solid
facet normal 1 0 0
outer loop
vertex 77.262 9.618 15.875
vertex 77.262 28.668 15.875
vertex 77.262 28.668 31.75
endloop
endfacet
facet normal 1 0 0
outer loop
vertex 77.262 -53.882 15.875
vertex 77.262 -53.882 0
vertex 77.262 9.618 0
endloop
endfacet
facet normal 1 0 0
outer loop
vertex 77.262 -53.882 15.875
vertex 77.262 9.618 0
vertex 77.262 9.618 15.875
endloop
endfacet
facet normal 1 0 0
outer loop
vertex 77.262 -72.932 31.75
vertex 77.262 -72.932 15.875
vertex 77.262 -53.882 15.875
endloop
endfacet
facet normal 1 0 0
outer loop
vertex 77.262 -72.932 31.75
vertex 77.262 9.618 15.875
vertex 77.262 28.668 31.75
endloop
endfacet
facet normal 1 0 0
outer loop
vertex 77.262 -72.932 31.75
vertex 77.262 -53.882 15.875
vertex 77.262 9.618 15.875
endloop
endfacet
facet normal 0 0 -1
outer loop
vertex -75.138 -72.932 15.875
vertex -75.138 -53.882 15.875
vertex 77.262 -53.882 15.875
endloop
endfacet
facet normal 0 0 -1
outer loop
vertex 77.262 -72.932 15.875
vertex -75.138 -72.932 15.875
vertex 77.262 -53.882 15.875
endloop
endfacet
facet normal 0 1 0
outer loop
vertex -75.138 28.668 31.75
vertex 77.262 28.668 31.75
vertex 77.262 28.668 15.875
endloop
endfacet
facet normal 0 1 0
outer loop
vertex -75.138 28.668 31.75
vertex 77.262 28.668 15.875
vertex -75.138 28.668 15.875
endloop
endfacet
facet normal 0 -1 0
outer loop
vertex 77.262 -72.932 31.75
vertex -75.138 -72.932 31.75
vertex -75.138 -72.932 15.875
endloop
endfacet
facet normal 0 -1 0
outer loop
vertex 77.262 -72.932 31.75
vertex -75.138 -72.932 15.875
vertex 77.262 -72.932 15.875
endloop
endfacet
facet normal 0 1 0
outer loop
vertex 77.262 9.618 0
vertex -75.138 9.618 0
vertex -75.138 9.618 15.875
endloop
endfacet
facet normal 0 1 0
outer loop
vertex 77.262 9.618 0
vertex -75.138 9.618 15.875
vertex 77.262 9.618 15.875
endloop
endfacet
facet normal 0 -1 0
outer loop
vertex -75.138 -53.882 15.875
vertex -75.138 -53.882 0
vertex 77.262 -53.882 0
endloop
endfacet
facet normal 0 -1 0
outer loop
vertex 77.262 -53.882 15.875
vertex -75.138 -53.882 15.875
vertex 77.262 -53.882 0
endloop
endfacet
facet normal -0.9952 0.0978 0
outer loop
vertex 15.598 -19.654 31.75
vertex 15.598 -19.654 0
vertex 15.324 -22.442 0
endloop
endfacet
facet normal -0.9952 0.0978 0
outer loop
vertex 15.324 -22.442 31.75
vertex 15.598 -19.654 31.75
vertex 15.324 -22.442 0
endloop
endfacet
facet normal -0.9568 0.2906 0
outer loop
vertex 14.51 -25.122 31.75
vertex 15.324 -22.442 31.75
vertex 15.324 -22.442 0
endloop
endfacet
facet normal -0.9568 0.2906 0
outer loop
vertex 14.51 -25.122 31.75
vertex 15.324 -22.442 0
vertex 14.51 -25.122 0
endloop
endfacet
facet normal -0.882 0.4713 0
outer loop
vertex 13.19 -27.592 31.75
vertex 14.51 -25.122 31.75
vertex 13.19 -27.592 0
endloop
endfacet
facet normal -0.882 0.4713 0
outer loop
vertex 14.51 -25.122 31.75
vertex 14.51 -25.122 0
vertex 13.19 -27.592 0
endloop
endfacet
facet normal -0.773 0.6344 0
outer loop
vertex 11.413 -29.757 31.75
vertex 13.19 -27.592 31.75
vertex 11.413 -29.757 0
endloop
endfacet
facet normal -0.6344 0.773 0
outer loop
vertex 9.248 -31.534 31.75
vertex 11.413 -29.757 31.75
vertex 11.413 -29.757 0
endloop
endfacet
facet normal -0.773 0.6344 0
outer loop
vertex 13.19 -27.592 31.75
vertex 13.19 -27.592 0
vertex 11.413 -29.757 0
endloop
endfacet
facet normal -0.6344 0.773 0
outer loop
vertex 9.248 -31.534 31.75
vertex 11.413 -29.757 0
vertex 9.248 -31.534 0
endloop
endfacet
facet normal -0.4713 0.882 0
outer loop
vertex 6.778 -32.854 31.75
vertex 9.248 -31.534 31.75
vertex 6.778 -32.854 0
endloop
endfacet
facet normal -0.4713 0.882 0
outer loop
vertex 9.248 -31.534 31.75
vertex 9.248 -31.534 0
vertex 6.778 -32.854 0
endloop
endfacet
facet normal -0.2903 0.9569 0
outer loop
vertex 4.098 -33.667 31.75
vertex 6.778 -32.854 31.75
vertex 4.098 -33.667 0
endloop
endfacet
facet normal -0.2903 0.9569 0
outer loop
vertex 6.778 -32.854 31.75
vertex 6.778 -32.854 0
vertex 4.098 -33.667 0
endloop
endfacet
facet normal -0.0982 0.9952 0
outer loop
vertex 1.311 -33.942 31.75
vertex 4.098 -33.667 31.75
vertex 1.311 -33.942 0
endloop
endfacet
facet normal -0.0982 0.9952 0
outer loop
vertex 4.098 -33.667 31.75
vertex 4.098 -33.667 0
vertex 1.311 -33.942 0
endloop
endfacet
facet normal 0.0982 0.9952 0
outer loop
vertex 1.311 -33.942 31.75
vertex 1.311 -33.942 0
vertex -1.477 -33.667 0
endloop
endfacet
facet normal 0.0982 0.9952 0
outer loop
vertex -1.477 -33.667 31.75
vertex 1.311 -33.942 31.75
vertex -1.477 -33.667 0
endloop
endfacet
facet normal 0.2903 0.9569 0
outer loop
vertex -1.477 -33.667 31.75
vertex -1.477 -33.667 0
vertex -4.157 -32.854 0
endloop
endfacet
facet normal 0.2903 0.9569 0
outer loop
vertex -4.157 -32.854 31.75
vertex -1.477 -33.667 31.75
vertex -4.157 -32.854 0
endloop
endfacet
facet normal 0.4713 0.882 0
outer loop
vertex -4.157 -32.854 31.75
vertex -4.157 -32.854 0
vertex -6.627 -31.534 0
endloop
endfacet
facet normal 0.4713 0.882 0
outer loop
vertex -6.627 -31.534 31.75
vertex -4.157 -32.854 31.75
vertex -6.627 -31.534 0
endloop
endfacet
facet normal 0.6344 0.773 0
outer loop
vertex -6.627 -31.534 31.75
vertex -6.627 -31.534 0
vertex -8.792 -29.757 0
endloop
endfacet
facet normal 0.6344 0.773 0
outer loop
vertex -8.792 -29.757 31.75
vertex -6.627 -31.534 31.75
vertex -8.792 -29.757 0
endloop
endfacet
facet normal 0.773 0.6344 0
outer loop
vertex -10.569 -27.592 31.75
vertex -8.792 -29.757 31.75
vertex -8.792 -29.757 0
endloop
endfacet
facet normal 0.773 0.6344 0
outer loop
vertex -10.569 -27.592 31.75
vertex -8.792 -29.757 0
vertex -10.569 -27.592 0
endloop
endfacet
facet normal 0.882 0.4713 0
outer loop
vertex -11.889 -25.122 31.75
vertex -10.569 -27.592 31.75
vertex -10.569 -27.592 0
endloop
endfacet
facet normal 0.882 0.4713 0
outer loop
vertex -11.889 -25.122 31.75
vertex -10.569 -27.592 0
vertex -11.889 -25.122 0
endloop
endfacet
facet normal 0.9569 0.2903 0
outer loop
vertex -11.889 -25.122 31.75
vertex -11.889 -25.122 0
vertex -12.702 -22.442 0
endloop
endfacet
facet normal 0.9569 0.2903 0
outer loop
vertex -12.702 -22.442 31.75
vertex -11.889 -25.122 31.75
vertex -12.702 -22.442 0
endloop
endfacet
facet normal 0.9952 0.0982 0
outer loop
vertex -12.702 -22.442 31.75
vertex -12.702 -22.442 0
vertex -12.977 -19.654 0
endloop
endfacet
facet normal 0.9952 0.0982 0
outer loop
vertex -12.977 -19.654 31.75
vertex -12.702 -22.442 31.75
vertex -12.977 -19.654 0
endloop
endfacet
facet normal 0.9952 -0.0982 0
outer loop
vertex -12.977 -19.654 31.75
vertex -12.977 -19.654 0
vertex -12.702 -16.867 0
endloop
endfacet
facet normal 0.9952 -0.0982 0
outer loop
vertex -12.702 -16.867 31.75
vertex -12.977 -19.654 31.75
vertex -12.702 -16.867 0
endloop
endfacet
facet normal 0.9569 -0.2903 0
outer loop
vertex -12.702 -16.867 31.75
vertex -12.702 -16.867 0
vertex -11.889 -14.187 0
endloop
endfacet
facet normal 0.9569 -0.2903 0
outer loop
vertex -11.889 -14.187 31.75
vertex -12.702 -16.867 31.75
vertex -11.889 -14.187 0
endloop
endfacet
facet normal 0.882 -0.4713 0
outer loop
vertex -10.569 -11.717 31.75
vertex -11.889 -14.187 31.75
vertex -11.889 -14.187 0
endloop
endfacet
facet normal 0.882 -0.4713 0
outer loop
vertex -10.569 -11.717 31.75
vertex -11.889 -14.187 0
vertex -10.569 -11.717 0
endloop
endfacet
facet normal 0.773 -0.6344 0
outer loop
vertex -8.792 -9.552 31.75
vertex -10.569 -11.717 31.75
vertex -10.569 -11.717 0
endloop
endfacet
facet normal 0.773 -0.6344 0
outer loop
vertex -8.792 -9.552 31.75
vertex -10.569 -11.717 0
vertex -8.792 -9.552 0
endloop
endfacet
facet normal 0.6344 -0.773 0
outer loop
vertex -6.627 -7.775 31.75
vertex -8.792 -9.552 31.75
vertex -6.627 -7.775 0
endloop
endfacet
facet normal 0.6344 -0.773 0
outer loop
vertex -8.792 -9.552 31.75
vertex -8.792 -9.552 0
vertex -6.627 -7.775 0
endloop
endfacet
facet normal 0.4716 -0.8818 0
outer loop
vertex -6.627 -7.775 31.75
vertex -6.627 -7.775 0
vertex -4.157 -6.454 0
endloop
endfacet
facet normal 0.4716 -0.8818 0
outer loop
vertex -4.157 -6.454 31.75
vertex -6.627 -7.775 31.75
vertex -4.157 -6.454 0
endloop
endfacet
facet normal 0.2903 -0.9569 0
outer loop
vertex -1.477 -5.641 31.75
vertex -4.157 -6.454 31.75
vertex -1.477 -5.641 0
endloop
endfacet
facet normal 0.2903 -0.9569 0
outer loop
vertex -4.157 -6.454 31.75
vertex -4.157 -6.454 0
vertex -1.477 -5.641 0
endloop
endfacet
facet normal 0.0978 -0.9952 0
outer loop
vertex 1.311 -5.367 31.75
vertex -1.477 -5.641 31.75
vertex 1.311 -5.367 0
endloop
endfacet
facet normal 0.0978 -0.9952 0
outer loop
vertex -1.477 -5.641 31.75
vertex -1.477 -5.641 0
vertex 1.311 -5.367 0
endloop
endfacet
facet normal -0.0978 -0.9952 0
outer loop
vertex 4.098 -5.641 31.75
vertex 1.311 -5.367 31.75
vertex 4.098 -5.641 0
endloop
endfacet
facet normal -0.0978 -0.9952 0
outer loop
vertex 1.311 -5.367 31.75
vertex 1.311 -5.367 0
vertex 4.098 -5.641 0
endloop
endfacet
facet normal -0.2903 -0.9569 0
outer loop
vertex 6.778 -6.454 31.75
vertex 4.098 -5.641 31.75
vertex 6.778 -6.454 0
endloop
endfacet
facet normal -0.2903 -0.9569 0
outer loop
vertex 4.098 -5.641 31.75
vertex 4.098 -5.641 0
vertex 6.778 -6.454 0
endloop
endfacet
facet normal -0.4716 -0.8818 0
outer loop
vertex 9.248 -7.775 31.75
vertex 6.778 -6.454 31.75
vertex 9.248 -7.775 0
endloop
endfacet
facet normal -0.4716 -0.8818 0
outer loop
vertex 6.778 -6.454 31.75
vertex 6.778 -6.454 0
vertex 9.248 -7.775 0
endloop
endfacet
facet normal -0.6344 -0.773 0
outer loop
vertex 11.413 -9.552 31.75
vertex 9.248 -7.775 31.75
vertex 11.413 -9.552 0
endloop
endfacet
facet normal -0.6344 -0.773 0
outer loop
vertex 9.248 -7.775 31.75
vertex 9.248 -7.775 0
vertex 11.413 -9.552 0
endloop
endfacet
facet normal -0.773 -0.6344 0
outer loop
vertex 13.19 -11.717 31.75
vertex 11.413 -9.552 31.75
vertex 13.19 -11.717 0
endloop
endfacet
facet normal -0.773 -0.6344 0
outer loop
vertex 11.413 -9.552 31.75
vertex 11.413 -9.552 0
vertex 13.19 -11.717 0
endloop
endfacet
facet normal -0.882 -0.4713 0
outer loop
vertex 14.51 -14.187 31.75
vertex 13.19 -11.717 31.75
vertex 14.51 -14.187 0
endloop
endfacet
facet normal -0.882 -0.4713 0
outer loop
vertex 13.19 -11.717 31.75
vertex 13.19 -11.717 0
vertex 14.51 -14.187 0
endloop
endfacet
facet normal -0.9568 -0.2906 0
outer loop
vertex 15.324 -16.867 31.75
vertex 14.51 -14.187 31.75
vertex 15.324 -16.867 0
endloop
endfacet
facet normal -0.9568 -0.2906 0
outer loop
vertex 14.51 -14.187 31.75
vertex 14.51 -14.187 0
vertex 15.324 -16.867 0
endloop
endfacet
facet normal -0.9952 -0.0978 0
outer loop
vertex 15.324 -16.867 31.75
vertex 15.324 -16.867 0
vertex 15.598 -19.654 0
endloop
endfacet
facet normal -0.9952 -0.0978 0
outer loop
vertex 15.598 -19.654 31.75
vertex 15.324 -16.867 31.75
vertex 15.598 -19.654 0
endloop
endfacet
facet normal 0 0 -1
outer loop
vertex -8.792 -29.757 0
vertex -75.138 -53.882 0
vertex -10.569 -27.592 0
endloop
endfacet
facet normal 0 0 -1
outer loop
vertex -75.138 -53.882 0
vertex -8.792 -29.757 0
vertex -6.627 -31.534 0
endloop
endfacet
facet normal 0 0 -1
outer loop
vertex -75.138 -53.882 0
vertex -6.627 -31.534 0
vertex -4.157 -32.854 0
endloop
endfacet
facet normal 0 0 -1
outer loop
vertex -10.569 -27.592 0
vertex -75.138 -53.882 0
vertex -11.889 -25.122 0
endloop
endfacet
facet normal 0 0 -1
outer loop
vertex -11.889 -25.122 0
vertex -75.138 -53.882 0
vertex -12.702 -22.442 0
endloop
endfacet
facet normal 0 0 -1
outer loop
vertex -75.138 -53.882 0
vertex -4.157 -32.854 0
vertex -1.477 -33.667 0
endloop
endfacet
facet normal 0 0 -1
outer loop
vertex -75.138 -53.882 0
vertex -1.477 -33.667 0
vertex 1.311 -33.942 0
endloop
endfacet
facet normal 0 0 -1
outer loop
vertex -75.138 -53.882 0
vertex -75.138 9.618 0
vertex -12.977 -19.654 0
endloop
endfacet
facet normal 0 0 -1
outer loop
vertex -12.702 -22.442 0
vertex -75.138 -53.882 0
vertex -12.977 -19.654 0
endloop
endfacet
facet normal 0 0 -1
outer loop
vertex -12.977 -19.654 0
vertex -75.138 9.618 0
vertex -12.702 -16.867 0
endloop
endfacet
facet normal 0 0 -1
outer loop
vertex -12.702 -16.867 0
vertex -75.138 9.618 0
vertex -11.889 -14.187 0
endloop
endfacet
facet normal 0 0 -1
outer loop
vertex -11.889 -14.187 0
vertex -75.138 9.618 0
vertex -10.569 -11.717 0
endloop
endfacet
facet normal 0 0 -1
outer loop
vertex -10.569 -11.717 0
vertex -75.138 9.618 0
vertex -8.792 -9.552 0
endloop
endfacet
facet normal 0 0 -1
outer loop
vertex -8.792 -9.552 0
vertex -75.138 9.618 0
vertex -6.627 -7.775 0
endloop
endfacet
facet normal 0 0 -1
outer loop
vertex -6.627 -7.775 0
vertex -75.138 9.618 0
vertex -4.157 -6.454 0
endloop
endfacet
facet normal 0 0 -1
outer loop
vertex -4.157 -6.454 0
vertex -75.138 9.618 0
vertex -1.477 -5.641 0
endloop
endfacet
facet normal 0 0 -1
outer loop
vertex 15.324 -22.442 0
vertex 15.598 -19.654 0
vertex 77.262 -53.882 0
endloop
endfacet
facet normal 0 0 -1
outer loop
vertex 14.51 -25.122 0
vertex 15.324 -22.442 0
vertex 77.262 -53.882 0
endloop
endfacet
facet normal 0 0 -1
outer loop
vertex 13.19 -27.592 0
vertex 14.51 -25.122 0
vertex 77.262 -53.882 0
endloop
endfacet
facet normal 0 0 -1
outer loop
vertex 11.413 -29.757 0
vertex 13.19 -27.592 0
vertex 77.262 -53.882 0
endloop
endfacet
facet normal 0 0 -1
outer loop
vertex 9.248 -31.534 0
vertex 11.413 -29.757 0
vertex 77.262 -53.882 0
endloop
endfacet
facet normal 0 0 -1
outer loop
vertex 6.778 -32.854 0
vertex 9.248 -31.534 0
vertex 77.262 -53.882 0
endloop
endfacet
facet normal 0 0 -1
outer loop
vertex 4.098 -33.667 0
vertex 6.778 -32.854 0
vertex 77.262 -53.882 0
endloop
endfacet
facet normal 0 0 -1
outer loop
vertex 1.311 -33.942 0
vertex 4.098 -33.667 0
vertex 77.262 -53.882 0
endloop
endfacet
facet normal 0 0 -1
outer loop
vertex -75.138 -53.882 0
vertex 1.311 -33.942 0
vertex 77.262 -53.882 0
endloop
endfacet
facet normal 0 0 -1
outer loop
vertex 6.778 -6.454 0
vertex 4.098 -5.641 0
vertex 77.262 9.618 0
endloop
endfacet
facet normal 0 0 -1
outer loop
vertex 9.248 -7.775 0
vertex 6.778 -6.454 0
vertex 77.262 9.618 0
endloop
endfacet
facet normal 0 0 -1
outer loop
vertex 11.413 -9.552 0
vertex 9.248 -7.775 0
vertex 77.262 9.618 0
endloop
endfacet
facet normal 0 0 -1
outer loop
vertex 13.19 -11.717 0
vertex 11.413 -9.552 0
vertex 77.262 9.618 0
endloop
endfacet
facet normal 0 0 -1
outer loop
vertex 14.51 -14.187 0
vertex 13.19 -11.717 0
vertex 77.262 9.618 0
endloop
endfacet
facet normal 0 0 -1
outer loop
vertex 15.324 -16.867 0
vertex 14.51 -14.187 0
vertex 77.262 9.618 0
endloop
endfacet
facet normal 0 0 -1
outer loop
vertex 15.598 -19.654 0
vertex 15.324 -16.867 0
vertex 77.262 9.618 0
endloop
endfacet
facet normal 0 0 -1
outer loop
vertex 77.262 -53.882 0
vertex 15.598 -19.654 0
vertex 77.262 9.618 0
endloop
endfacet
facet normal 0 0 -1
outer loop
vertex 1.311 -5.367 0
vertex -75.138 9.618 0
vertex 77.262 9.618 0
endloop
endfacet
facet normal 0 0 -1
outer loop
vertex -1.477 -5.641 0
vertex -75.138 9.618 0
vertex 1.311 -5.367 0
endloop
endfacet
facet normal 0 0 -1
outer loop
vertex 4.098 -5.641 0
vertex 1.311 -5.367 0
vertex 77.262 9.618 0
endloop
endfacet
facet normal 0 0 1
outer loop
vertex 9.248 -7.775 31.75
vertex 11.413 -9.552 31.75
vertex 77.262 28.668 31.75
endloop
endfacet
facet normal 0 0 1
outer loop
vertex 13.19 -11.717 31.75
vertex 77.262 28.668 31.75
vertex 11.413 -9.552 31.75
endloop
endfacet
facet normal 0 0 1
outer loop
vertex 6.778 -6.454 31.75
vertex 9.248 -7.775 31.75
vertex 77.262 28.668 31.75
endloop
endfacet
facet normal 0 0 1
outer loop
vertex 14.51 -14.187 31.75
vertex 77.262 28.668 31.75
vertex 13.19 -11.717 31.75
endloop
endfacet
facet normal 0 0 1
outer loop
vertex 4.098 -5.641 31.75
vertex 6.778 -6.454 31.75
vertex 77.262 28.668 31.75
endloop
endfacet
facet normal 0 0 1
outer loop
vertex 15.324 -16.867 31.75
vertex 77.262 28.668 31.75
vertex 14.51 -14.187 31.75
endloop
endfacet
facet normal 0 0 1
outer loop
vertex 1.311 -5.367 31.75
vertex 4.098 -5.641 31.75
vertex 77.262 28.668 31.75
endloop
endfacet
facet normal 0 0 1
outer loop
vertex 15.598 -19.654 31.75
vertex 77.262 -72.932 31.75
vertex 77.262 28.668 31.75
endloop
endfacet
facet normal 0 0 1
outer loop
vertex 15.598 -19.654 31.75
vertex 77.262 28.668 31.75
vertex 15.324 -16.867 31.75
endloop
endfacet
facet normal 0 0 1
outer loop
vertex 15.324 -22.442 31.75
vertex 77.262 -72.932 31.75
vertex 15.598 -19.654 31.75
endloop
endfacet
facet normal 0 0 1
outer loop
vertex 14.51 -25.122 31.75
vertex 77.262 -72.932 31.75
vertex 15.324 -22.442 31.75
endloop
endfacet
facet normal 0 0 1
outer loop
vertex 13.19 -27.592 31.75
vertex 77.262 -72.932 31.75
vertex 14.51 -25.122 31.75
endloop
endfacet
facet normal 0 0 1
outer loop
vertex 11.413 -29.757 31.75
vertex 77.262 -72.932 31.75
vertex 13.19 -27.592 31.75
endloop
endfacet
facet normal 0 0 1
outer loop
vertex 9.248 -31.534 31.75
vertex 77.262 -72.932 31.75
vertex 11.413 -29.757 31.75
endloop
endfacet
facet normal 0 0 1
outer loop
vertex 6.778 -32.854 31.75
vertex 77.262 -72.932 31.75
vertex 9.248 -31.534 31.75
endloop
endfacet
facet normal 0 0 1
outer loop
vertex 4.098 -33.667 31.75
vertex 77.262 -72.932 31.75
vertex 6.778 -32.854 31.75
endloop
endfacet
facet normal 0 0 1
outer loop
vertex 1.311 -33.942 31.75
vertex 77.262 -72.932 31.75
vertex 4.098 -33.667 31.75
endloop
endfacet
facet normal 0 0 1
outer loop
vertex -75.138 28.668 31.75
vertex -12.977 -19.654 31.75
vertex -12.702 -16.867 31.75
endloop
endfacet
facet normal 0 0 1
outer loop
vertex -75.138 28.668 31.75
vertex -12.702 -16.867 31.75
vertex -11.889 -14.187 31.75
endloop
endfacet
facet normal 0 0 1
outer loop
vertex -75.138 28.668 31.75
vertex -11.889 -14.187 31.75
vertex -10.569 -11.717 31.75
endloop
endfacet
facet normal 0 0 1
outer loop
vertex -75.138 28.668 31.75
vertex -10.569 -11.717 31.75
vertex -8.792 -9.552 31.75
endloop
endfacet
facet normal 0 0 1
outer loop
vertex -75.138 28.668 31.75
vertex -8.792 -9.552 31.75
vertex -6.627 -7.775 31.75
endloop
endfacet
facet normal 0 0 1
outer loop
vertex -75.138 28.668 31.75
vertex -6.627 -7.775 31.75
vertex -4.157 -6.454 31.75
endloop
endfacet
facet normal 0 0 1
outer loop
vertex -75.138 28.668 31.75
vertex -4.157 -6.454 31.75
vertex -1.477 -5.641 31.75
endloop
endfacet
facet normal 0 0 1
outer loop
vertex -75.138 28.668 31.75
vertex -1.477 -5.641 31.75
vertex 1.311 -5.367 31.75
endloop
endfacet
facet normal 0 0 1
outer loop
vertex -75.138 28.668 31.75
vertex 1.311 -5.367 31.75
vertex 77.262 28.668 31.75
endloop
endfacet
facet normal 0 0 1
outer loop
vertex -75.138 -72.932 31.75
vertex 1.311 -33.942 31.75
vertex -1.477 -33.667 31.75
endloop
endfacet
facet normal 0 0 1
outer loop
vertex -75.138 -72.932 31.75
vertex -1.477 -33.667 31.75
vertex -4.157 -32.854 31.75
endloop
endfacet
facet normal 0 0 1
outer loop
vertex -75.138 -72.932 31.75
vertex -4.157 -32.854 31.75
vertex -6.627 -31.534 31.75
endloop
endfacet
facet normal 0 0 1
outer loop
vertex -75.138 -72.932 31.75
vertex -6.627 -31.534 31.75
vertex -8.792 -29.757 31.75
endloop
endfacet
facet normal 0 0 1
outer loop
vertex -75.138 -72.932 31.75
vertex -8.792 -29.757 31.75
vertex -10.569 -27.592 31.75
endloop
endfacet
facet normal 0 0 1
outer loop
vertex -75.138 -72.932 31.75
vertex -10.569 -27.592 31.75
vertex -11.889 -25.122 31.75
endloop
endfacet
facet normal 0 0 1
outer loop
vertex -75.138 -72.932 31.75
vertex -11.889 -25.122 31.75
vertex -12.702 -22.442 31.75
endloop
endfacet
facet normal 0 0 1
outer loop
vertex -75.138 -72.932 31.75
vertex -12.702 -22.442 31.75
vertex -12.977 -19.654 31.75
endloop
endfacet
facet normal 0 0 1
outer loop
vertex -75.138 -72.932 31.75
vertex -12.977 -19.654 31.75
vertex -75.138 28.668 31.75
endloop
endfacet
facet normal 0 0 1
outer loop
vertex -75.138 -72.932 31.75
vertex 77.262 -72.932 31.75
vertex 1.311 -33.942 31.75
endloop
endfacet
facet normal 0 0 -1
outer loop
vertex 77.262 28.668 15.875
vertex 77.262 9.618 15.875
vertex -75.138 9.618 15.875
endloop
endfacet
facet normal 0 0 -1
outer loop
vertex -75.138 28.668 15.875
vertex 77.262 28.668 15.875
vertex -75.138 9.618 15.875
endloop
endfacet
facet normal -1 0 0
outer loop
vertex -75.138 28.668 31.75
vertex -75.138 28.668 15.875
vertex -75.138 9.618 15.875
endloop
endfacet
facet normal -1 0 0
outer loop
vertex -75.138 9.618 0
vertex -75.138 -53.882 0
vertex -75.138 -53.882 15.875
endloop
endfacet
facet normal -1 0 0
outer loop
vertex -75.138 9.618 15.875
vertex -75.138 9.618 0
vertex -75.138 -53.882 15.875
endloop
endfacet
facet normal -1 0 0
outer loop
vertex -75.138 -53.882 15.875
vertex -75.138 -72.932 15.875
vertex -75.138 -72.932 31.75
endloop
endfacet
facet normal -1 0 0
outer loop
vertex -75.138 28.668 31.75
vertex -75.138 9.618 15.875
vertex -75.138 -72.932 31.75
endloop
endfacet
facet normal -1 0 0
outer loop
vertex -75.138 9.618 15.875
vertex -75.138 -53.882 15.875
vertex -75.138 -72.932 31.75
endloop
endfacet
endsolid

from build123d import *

# Parameters (mm, degrees)
F0_W     = 152.4
F0_H     = 63.5
F1_DEPTH = 31.75
F3_W     = 152.4
F3_H     = 15.875
F4_DEPTH = 19.05
F2_W     = 152.4
F2_H     = 15.875
F5_DEPTH = 19.05
F7_R     = 14.2875
F8_DEPTH = 31.751


with BuildPart() as f1:
    # F0 (on Top) → F1 (new body)
    with BuildSketch(Plane.XY):
        with Locations((1.061699, -22.131501)):
            Rectangle(F0_W, F0_H)
    extrude(amount=F1_DEPTH)

    # F3 (on face) → F4 (join)
    with BuildSketch(Plane.XZ.offset(53.881501)):
        with Locations((1.061699, 23.8125)):
            Rectangle(F3_W, F3_H)
    extrude(amount=F4_DEPTH)

    # F2 (on face) → F5 (join)
    with BuildSketch(Plane(origin=(0, 9.618499, 0), x_dir=(-1, 0, 0), z_dir=(0, 1, 0))):
        with Locations((-1.061699, 23.8125)):
            Rectangle(F2_W, F2_H)
    extrude(amount=F5_DEPTH)

    # F7 (on face) → F8 (cut, through all)
    with BuildSketch(Plane(origin=(0, 0, 0), x_dir=(1, 0, 0), z_dir=(0, 0, -1))):
        with Locations((1.310549, 19.654326)):
            Circle(F7_R)
    extrude(amount=-F8_DEPTH, mode=Mode.SUBTRACT)


solid = f1.part
